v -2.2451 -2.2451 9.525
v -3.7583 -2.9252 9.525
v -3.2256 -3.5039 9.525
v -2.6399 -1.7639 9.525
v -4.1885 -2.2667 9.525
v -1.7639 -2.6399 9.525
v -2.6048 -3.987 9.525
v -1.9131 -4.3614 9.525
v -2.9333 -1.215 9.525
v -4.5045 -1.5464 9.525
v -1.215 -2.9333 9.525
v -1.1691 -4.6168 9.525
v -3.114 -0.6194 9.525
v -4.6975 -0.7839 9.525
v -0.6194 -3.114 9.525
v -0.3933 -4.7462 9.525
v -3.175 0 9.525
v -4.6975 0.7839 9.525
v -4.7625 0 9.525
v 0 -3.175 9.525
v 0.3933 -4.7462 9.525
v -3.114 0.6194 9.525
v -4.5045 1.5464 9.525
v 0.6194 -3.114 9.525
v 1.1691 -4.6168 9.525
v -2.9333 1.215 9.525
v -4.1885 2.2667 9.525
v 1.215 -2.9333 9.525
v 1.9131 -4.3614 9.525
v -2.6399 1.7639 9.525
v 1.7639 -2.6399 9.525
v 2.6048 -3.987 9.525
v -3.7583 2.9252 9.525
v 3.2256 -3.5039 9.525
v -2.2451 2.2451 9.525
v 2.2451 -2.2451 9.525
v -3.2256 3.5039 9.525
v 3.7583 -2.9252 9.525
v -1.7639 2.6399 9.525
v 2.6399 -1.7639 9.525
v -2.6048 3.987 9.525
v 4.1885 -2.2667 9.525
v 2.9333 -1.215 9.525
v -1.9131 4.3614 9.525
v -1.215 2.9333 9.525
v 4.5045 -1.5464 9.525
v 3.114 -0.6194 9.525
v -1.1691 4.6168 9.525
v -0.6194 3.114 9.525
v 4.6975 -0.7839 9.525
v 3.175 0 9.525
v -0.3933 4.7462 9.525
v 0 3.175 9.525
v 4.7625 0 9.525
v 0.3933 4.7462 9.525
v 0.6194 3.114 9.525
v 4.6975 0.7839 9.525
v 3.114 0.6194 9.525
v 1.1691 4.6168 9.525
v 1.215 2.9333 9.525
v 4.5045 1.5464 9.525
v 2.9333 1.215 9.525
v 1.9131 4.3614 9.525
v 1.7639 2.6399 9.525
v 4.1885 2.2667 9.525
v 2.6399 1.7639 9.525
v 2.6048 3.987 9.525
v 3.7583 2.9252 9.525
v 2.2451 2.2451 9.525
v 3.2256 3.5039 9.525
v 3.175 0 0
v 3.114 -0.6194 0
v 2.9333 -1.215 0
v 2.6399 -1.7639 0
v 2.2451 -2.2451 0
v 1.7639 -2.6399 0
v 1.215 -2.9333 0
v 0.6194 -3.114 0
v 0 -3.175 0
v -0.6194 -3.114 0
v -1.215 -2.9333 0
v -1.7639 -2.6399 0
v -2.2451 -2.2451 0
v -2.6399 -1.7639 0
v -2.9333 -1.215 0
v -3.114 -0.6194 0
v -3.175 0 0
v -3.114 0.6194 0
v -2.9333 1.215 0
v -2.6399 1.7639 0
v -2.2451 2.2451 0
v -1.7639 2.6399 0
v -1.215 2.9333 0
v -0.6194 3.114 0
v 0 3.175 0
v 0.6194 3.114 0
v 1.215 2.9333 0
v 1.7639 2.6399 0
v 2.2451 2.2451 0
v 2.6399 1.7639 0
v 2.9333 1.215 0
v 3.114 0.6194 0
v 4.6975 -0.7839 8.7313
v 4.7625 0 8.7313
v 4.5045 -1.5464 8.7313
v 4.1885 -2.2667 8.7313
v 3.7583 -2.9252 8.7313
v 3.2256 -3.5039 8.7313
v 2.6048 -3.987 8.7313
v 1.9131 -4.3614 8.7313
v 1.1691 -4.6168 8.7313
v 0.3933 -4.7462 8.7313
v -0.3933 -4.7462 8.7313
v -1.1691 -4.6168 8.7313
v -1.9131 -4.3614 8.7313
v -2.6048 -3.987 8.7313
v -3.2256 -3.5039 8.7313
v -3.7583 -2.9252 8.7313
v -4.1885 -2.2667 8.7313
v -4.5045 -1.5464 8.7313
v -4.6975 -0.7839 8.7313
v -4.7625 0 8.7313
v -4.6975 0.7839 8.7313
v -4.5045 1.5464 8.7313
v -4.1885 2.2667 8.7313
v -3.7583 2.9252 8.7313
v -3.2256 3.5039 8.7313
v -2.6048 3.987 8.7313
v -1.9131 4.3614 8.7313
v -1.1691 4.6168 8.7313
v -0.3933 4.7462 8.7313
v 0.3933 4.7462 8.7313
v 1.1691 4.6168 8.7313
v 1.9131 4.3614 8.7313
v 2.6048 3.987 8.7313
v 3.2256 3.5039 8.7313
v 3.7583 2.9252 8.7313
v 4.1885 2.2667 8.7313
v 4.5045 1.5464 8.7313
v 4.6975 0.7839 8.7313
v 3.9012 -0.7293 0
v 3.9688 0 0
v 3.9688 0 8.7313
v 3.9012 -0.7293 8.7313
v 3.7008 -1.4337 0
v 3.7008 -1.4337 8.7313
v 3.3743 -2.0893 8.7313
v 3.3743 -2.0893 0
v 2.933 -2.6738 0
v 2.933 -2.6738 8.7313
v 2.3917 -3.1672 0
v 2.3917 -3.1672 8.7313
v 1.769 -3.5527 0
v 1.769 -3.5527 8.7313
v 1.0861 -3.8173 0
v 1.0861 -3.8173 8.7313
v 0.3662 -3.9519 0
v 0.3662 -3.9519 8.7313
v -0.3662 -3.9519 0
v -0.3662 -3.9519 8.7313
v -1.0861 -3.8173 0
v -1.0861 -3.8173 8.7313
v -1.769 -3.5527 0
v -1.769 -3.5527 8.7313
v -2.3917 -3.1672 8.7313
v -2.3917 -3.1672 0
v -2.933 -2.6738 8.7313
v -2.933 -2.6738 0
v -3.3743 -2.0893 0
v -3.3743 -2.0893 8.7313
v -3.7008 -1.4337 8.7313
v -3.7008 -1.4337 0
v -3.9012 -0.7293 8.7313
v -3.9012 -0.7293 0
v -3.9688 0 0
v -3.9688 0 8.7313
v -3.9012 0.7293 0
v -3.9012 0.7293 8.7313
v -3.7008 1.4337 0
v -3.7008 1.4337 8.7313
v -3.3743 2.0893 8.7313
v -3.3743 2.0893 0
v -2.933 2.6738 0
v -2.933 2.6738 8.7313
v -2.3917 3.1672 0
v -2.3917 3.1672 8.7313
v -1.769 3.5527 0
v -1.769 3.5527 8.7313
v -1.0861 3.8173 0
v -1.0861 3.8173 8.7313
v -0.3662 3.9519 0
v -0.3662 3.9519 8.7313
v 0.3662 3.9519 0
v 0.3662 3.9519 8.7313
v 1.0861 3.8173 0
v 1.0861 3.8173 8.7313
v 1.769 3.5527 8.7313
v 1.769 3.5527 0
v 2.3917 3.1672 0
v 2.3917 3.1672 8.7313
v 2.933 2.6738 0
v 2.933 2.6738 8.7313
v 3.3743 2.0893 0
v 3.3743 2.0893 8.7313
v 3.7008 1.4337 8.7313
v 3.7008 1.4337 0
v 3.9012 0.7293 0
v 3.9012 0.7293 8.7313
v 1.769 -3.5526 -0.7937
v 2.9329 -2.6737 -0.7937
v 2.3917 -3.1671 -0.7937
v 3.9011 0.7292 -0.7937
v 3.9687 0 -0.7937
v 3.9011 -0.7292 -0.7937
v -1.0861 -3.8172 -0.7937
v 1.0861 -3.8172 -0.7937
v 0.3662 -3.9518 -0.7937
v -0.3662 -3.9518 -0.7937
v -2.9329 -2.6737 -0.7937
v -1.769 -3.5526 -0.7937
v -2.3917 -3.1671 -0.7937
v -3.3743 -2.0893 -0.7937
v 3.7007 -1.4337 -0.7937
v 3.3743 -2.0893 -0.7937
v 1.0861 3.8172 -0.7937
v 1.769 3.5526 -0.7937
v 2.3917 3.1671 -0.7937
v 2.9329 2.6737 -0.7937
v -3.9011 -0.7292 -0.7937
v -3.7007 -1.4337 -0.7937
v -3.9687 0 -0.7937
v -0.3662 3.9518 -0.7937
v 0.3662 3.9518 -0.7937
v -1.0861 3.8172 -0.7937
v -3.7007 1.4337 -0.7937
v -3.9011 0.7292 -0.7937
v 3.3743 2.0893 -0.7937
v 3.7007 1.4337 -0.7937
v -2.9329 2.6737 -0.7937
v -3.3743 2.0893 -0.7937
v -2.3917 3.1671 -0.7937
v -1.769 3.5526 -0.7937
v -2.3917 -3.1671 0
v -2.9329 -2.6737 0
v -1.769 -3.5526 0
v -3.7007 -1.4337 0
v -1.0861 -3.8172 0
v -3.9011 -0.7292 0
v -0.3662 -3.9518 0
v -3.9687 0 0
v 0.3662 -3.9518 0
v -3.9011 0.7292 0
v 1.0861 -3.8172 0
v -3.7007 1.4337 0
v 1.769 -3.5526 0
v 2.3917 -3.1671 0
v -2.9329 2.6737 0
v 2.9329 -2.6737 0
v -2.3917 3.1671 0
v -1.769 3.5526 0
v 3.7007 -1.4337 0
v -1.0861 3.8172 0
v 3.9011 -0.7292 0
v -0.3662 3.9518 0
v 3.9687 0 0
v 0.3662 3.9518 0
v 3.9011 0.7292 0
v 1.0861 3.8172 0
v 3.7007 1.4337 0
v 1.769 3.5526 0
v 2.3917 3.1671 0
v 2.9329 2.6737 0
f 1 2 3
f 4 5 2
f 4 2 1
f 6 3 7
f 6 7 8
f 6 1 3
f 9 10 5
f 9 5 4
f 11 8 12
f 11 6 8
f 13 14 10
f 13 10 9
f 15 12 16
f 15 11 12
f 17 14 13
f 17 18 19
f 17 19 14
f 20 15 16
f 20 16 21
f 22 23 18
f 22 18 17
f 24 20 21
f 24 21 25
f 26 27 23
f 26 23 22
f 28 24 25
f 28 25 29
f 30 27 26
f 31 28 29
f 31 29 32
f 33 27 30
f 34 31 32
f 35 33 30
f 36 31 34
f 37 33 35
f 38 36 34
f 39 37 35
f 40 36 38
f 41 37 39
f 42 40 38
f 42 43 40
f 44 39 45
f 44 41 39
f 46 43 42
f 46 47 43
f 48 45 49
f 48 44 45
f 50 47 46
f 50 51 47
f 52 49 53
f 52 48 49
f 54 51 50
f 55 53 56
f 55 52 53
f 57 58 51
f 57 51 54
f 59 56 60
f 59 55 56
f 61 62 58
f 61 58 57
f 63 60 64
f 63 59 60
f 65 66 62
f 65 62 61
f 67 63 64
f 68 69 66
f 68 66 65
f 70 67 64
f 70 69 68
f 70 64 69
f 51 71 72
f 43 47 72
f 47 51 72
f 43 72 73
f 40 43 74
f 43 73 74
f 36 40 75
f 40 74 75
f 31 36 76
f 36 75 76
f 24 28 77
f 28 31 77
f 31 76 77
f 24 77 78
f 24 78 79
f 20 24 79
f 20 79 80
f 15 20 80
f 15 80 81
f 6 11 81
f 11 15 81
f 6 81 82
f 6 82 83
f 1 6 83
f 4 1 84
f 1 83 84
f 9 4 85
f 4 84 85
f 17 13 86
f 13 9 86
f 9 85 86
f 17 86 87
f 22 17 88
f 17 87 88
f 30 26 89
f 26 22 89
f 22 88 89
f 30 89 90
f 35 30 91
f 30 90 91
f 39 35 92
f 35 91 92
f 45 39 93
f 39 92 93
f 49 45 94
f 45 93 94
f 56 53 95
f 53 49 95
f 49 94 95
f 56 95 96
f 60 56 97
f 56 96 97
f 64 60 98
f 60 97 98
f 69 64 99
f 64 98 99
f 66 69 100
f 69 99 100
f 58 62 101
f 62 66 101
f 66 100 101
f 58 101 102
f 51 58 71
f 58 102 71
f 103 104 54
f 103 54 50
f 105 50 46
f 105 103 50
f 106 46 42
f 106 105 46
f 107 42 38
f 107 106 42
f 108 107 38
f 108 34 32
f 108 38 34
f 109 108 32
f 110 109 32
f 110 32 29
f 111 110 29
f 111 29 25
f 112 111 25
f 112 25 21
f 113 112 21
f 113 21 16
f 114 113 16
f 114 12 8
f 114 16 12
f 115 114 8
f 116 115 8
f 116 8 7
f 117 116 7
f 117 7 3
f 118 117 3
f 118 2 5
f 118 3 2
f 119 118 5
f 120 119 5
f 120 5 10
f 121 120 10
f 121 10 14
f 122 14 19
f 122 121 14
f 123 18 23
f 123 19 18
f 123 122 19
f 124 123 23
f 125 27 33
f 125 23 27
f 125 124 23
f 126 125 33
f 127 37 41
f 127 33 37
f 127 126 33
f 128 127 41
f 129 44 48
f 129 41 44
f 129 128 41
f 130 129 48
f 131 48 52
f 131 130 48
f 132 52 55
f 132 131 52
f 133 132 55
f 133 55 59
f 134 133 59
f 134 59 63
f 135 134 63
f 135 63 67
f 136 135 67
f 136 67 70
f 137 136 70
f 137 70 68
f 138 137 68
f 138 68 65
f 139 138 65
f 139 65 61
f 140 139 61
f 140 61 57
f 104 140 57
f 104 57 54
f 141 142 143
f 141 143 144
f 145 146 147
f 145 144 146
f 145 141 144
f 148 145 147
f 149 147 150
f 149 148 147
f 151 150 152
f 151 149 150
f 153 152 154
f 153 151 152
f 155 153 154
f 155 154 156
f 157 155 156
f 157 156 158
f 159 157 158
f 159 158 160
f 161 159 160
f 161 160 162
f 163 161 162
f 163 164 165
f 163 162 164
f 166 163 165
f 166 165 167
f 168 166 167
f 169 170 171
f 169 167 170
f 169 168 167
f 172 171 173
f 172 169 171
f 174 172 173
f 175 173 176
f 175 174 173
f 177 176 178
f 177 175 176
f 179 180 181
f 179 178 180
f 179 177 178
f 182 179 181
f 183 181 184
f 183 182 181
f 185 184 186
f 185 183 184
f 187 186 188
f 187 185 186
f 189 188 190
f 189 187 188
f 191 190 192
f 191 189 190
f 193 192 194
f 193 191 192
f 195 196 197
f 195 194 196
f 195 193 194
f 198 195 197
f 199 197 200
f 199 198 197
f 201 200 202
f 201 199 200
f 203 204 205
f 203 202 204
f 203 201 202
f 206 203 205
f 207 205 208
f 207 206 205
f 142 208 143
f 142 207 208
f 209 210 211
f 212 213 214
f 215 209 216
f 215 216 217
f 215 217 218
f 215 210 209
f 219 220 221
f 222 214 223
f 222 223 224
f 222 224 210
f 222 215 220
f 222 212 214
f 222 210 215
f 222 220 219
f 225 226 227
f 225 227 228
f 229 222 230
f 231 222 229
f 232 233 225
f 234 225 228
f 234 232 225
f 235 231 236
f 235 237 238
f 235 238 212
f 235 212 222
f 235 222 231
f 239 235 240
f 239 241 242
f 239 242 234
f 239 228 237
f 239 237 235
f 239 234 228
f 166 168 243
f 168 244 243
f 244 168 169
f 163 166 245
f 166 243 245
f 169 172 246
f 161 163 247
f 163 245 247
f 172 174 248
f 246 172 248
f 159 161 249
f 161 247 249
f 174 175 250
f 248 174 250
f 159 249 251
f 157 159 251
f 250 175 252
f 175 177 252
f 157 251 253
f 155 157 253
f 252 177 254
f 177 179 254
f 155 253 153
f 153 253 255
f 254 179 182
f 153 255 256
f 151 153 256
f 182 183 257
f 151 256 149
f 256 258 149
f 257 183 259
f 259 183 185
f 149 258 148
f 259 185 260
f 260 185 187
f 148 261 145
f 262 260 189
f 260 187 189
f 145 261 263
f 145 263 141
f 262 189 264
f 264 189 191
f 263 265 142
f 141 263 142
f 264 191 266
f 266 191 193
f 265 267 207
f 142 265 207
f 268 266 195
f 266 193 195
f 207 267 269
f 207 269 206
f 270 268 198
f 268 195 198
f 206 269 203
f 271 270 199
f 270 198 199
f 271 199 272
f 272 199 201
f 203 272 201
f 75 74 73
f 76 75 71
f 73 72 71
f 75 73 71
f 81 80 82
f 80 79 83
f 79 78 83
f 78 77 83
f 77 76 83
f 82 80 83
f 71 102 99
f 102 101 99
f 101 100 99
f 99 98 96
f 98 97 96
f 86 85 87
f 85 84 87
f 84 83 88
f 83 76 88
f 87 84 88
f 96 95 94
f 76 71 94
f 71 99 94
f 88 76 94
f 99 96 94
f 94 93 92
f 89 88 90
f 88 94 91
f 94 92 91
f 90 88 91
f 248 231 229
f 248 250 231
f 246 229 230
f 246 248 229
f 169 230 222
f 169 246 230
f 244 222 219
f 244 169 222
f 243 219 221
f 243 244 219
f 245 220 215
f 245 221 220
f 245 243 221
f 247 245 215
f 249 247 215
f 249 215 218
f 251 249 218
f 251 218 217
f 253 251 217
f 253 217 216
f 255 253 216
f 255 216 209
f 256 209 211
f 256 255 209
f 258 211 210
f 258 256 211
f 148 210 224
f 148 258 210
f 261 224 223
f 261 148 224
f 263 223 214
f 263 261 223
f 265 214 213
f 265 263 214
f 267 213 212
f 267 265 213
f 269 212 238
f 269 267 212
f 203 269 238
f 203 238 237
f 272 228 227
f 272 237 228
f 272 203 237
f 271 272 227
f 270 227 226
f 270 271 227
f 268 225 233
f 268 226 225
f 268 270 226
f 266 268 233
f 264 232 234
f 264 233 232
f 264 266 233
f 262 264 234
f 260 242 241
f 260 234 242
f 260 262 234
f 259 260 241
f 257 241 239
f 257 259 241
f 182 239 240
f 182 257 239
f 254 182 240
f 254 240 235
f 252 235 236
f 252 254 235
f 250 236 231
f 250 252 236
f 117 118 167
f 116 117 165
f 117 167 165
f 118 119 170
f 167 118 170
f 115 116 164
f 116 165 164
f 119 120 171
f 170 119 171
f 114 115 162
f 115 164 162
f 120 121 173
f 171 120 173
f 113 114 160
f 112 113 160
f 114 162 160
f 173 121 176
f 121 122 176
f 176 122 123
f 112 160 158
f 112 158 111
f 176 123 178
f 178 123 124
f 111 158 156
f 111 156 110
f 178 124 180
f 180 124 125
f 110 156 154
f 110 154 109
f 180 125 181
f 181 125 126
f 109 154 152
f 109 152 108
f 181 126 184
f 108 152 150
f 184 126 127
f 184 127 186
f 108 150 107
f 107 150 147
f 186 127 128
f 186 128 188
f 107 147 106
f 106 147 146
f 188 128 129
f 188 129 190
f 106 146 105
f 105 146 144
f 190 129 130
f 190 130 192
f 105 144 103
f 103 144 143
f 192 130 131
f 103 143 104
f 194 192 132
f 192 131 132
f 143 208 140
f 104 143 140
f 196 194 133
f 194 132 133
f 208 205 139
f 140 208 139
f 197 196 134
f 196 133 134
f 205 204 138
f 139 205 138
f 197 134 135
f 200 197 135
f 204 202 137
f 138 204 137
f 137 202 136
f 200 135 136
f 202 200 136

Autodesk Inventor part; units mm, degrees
ref_plane "YZ Plane" through (0, 0, 0) normal (1, 0, 0) x (0, 1, 0)
ref_plane "XZ Plane" through (0, 0, 0) normal (0, 1, 0) x (-1, 0, 0)
ref_plane "XY Plane" through (0, 0, 0) normal (0, 0, 1) x (1, 0, 0)
sketch "Sketch1" plane through (0, 0, 0) normal (0, 0, 1) x (1, 0, 0)
  circle A0 centre (0, 0) radius 3.175
  circle A1 centre (0, 0) radius 3.9688
  dimension "d0" = 7.9375
  dimension "d2" = 6.35
extrude "Extrusion1" add sketch "Sketch1" along normal blind 8.7313
sketch "Sketch2" plane through (0, 0, 0) normal (0, 0, -1) x (-1, 0, 0)
  circle A0 centre (0, 0) radius 3.9687 projected
extrude "Extrusion2" add sketch "Sketch2" along normal blind 0.7937
sketch "Sketch3" plane through (0, 0, 8.7313) normal (0, 0, 1) x (1, 0, 0)
  circle A0 centre (0, 0) radius 3.175 projected
  circle A1 centre (0, 0) radius 3.9687 projected
  circle A2 centre (0, 0) radius 4.7625
  dimension "d7" = 9.525
extrude "Extrusion3" add sketch "Sketch3" along normal blind 0.7937 contours A1 | A2
thread "Thread1" size "1/4-20 UNC" class "2B" standard "ANSI Unified Screw Threads" full length
properties part number "threaded_insert_1-4-20"
